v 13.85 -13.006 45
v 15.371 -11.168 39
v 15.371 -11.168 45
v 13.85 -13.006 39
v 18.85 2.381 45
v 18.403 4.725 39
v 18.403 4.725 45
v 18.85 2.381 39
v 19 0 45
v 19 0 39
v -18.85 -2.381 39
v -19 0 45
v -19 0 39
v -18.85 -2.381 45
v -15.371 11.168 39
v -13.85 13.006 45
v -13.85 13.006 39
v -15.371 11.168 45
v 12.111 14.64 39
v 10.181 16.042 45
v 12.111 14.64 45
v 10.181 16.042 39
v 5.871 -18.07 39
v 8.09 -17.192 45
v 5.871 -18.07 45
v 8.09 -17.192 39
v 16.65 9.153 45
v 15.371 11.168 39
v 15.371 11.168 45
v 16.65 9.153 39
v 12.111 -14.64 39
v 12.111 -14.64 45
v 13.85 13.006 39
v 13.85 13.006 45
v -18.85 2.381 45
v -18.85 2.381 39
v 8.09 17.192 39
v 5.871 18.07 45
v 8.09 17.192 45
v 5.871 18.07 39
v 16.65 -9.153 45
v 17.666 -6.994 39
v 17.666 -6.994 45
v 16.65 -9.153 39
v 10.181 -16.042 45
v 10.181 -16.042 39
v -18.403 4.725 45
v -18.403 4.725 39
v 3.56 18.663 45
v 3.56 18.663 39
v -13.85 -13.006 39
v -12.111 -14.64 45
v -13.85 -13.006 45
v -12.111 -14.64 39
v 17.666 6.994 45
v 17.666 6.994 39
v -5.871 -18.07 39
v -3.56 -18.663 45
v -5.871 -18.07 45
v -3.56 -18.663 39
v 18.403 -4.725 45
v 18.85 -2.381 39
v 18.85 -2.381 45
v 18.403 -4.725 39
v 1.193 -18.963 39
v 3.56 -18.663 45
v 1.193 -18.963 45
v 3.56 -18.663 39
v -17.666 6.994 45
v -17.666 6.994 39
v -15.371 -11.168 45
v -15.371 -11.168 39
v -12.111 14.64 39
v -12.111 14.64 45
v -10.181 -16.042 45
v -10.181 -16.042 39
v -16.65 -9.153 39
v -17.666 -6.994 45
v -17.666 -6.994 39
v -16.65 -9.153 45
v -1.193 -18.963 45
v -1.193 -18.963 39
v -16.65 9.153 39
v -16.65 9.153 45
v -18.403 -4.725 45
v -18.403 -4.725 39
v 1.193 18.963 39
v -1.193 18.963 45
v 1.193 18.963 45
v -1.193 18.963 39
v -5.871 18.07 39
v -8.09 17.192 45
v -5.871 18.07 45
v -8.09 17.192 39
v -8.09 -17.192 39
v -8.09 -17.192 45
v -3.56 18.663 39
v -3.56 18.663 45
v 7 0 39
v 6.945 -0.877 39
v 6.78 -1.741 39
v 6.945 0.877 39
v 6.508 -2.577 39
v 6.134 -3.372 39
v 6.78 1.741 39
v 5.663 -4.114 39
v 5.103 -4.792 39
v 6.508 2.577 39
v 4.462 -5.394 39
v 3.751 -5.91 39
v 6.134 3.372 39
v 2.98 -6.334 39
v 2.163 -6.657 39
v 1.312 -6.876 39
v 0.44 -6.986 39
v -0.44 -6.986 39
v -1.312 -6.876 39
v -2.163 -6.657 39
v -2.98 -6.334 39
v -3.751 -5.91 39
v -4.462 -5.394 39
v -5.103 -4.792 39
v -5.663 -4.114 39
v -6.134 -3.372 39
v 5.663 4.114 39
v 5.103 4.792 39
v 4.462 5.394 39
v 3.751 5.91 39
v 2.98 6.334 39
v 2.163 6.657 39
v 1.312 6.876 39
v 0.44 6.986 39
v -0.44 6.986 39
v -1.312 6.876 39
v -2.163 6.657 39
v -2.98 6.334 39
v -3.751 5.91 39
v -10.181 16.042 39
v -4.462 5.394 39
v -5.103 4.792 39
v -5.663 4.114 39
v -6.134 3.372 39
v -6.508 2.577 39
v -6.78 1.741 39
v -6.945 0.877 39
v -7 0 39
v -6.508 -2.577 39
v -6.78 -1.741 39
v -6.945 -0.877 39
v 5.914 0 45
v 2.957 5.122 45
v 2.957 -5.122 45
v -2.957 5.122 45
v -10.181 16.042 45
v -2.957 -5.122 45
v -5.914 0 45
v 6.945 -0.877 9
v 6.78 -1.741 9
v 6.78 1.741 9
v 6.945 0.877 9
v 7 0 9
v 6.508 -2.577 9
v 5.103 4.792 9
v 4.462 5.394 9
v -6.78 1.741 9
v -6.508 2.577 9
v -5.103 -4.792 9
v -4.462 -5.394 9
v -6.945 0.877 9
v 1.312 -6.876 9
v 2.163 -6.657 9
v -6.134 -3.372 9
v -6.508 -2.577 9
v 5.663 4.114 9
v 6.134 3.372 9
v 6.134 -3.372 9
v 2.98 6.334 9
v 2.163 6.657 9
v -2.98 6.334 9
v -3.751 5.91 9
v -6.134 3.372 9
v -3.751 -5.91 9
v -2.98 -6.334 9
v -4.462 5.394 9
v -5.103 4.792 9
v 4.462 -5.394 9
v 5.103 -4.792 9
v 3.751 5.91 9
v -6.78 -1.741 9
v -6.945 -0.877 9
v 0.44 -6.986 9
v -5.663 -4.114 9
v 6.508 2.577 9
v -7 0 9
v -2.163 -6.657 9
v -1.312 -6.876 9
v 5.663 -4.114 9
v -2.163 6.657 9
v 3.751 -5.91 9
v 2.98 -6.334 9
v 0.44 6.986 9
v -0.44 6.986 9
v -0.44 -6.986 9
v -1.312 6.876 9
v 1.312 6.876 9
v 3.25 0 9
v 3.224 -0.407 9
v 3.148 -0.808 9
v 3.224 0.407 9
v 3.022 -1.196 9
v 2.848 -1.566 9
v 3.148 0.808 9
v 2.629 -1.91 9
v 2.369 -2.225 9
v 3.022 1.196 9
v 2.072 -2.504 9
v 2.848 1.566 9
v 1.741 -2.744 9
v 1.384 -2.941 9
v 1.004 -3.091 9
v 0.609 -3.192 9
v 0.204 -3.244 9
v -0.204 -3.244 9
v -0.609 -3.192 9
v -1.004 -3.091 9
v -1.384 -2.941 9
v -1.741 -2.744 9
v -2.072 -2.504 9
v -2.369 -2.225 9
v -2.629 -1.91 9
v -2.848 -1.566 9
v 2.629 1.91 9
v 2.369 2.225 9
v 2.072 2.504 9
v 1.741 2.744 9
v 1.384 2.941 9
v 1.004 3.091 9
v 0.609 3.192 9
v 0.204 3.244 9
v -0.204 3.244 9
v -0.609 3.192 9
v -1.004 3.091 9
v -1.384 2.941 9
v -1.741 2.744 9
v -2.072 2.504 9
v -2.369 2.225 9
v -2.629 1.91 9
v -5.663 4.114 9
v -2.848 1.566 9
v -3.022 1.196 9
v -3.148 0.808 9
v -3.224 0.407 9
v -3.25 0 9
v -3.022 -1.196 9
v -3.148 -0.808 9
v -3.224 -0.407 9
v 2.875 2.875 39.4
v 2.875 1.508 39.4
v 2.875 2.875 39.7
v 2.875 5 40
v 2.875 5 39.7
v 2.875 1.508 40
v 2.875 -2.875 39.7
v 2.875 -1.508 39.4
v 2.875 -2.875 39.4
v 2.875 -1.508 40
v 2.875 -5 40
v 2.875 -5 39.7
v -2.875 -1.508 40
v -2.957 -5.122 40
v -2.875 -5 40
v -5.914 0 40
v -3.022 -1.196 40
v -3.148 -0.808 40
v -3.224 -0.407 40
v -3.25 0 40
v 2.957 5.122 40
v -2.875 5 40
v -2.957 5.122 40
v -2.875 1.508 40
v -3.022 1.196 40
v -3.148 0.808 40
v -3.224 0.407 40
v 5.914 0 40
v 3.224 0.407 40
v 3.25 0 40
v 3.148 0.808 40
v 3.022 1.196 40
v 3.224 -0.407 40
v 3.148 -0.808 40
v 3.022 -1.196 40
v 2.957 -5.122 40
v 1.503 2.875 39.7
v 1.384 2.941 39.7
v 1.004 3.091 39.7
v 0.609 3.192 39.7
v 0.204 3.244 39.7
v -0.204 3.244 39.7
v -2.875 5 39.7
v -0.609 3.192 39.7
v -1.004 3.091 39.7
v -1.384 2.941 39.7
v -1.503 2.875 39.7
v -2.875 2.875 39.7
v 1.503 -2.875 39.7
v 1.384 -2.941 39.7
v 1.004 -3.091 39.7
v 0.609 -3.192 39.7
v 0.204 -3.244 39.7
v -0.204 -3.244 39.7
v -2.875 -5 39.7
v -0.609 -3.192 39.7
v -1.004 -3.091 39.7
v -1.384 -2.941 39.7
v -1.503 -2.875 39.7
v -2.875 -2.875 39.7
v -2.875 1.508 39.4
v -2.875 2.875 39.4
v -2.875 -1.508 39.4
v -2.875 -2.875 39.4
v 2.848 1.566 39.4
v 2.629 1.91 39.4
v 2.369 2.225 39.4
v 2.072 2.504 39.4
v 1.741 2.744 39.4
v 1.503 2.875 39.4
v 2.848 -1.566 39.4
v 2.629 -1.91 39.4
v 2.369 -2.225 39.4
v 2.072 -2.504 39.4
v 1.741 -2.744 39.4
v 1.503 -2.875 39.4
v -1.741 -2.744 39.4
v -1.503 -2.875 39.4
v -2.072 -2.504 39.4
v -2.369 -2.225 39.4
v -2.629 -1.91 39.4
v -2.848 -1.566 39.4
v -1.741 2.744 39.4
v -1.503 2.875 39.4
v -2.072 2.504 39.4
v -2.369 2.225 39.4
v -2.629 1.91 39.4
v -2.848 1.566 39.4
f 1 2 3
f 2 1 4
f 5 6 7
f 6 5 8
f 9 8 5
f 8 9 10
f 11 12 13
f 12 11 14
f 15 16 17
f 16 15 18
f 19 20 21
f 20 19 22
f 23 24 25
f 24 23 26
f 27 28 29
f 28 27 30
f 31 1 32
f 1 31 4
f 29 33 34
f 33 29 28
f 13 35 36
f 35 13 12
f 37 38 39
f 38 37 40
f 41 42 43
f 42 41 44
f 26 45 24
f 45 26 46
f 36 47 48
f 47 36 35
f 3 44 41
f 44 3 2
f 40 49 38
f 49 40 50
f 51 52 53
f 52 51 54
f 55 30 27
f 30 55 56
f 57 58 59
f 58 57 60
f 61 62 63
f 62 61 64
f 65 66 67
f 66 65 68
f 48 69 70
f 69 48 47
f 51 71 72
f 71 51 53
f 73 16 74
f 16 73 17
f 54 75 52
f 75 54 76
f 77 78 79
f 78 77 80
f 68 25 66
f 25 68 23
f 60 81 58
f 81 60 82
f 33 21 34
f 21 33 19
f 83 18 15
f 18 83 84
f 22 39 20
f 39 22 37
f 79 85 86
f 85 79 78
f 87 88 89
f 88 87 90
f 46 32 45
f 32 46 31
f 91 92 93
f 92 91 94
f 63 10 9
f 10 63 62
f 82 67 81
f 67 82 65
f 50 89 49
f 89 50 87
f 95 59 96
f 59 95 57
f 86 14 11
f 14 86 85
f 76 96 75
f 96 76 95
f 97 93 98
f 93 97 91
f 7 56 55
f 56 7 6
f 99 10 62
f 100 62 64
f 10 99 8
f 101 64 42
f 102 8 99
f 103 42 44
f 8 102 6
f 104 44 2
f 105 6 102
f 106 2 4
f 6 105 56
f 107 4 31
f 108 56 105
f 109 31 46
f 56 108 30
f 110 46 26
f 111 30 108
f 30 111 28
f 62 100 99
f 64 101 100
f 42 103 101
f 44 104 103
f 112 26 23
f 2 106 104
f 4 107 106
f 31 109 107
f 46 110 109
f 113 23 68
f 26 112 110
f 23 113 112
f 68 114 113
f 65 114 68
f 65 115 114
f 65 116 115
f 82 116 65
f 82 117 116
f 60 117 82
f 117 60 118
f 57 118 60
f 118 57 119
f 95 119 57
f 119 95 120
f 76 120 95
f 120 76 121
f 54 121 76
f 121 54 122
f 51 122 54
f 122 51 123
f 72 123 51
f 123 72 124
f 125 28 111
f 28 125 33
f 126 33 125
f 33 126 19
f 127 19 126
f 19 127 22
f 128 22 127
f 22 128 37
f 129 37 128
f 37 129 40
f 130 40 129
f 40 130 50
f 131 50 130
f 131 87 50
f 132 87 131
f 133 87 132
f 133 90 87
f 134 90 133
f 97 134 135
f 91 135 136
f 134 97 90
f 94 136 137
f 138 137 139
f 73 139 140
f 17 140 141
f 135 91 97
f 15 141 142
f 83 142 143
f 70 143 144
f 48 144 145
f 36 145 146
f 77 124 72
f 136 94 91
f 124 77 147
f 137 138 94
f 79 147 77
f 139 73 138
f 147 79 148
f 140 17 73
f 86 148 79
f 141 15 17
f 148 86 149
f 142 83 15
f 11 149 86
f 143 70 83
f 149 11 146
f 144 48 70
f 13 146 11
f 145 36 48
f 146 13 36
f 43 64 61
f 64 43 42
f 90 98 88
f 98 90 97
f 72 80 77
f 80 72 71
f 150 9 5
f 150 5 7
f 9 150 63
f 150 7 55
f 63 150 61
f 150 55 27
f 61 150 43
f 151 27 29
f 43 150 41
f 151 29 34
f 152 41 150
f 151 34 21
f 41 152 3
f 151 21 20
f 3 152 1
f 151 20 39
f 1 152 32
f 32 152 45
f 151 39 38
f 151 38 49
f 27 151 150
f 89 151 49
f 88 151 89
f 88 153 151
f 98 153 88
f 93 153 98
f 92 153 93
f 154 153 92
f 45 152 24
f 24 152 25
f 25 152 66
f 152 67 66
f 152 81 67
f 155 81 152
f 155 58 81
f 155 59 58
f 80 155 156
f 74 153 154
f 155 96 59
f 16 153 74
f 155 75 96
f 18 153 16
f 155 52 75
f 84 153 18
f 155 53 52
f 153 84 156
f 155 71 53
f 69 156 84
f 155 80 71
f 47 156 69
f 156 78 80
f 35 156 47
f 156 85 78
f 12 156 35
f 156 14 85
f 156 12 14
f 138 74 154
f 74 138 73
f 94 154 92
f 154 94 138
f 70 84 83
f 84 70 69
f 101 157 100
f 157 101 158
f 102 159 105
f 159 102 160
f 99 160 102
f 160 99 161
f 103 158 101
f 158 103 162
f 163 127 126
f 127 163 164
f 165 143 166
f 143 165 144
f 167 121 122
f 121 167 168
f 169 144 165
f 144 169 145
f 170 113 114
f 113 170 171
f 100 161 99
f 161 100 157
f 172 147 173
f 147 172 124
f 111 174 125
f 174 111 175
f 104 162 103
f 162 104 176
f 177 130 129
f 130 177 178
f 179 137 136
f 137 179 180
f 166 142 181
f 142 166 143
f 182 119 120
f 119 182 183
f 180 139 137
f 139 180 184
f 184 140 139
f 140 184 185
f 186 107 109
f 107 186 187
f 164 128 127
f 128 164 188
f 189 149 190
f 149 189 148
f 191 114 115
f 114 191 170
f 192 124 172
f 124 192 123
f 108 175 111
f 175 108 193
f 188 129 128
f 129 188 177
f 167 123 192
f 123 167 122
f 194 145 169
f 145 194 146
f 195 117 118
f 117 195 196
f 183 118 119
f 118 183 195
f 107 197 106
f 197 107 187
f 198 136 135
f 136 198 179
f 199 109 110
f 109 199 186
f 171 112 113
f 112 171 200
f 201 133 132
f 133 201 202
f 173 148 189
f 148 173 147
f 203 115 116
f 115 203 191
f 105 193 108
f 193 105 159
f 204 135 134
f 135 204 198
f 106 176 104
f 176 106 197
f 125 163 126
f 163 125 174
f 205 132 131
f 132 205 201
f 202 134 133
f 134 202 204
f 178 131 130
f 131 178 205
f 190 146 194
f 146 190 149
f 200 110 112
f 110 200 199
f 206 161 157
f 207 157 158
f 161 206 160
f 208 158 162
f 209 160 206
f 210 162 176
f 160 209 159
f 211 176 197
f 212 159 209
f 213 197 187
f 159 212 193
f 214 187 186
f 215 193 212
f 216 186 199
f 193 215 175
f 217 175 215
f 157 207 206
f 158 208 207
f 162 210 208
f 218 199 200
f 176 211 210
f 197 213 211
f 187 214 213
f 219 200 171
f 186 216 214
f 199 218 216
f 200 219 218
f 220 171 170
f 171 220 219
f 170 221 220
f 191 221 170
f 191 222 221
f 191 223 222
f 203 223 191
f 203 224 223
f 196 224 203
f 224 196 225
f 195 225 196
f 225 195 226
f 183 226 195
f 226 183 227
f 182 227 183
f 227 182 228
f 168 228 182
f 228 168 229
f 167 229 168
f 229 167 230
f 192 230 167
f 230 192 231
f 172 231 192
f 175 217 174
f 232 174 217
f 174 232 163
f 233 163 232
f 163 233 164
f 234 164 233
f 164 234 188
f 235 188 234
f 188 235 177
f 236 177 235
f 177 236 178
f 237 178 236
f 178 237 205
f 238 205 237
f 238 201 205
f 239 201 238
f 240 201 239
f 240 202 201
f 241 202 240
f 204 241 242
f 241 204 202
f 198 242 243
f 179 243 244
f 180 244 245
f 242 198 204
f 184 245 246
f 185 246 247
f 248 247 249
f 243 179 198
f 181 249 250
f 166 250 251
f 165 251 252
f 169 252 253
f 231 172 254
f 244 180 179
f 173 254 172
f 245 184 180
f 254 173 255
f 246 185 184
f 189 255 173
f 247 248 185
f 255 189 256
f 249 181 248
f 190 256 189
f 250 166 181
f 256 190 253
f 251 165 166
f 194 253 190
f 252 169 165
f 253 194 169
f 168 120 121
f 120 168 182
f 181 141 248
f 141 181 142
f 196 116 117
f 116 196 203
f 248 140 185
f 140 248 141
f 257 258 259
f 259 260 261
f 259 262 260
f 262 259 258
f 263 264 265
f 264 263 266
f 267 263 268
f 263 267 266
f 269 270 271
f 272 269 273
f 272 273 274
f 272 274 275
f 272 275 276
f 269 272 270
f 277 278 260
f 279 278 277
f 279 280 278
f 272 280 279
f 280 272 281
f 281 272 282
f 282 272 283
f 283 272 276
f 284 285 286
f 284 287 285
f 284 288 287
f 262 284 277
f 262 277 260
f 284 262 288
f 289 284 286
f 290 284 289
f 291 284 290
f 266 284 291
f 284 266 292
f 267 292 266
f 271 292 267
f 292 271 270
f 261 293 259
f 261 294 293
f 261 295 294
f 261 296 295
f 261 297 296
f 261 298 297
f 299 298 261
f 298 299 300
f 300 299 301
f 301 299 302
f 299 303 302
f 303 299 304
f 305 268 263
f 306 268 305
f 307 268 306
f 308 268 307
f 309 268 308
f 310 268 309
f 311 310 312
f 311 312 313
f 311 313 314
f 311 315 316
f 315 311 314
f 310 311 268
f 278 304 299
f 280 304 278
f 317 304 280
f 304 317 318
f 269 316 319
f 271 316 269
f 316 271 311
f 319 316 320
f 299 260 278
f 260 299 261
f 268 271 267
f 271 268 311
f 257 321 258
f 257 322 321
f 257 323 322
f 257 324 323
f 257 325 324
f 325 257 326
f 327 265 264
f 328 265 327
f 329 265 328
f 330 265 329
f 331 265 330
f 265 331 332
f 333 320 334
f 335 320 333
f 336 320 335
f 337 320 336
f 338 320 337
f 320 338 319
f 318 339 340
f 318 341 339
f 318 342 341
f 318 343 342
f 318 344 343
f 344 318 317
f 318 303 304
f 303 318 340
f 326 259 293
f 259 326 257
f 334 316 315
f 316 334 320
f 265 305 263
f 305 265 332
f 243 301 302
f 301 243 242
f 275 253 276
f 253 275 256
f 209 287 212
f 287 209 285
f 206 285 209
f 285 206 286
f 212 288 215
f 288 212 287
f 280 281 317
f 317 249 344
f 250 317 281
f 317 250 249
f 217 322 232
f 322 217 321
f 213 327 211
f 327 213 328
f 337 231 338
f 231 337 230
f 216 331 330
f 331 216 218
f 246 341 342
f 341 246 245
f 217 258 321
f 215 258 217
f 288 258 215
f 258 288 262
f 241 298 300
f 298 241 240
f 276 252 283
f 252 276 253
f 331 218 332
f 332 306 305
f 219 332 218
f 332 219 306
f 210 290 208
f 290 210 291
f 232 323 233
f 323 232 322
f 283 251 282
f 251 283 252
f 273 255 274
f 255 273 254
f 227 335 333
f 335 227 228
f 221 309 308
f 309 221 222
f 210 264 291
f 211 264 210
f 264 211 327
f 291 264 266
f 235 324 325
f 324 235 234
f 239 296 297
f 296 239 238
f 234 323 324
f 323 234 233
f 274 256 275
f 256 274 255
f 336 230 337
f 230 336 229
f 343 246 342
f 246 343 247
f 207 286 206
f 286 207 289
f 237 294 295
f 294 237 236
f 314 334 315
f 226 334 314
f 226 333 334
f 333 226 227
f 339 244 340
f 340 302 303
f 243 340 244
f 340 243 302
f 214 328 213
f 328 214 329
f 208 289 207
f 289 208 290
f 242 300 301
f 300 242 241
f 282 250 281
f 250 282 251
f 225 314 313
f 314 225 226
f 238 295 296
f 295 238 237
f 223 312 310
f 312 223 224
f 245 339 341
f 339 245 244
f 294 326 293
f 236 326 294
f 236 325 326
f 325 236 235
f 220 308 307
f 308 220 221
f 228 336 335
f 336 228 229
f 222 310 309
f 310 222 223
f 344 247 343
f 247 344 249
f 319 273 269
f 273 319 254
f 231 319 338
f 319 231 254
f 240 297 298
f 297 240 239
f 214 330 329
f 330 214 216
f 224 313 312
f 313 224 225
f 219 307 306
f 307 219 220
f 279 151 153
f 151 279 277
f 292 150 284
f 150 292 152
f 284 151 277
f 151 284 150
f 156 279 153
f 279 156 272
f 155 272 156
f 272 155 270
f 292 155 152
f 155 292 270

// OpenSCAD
$fn = 50;


difference() {
	union() {
		translate(v = [0, 0, 39.0000000000]) {
			cylinder(h = 6, r = 19.0000000000);
		}
		translate(v = [0, 0, 9.0000000000]) {
			cylinder(h = 36, r = 7.0000000000);
		}
	}
	union() {
		translate(v = [0, 0, 45]) {
			rotate(a = [0, 0, 0]) {
				difference() {
					union() {
						#translate(v = [-2.8750000000, -5.0000000000, -5.3000000000]) {
							cube(size = [5.7500000000, 10, 0.3000000000]);
						}
						#translate(v = [-2.8750000000, -2.8750000000, -5.6000000000]) {
							cube(size = [5.7500000000, 5.7500000000, 0.3000000000]);
						}
						#translate(v = [-2.8750000000, -5.0000000000, 0]) {
							cube(size = [5.7500000000, 10, 0.3000000000]);
						}
						#translate(v = [-2.8750000000, -2.8750000000, 0.3000000000]) {
							cube(size = [5.7500000000, 5.7500000000, 0.3000000000]);
						}
						#translate(v = [0, 0, -100.0000000000]) {
							cylinder(h = 200, r = 3.2500000000);
						}
						translate(v = [0, 0, -5]) {
							#linear_extrude(height = 5) {
								polygon(points = [[5.9142500000, 0.0000000000], [2.9571250000, 5.1218907443], [-2.9571250000, 5.1218907443], [-5.9142500000, 0.0000000000], [-2.9571250000, -5.1218907443], [2.9571250000, -5.1218907443]]);
							}
						}
						#translate(v = [-2.8750000000, -5.0000000000, -5.3000000000]) {
							cube(size = [5.7500000000, 10, 0.3000000000]);
						}
						#translate(v = [-2.8750000000, -2.8750000000, -5.6000000000]) {
							cube(size = [5.7500000000, 5.7500000000, 0.3000000000]);
						}
						#translate(v = [-2.8750000000, -5.0000000000, 0]) {
							cube(size = [5.7500000000, 10, 0.3000000000]);
						}
						#translate(v = [-2.8750000000, -2.8750000000, 0.3000000000]) {
							cube(size = [5.7500000000, 5.7500000000, 0.3000000000]);
						}
						#translate(v = [0, 0, -100.0000000000]) {
							cylinder(h = 200, r = 3.2500000000);
						}
						#translate(v = [-2.8750000000, -5.0000000000, -5.3000000000]) {
							cube(size = [5.7500000000, 10, 0.3000000000]);
						}
						#translate(v = [-2.8750000000, -2.8750000000, -5.6000000000]) {
							cube(size = [5.7500000000, 5.7500000000, 0.3000000000]);
						}
						#translate(v = [-2.8750000000, -5.0000000000, 0]) {
							cube(size = [5.7500000000, 10, 0.3000000000]);
						}
						#translate(v = [-2.8750000000, -2.8750000000, 0.3000000000]) {
							cube(size = [5.7500000000, 5.7500000000, 0.3000000000]);
						}
						#translate(v = [0, 0, -100.0000000000]) {
							cylinder(h = 200, r = 3.2500000000);
						}
					}
					union();
				}
			}
		}
		#translate(v = [0, 0, -100.0000000000]) {
			cylinder(h = 200, r = 3.2500000000);
		}
	}
}
